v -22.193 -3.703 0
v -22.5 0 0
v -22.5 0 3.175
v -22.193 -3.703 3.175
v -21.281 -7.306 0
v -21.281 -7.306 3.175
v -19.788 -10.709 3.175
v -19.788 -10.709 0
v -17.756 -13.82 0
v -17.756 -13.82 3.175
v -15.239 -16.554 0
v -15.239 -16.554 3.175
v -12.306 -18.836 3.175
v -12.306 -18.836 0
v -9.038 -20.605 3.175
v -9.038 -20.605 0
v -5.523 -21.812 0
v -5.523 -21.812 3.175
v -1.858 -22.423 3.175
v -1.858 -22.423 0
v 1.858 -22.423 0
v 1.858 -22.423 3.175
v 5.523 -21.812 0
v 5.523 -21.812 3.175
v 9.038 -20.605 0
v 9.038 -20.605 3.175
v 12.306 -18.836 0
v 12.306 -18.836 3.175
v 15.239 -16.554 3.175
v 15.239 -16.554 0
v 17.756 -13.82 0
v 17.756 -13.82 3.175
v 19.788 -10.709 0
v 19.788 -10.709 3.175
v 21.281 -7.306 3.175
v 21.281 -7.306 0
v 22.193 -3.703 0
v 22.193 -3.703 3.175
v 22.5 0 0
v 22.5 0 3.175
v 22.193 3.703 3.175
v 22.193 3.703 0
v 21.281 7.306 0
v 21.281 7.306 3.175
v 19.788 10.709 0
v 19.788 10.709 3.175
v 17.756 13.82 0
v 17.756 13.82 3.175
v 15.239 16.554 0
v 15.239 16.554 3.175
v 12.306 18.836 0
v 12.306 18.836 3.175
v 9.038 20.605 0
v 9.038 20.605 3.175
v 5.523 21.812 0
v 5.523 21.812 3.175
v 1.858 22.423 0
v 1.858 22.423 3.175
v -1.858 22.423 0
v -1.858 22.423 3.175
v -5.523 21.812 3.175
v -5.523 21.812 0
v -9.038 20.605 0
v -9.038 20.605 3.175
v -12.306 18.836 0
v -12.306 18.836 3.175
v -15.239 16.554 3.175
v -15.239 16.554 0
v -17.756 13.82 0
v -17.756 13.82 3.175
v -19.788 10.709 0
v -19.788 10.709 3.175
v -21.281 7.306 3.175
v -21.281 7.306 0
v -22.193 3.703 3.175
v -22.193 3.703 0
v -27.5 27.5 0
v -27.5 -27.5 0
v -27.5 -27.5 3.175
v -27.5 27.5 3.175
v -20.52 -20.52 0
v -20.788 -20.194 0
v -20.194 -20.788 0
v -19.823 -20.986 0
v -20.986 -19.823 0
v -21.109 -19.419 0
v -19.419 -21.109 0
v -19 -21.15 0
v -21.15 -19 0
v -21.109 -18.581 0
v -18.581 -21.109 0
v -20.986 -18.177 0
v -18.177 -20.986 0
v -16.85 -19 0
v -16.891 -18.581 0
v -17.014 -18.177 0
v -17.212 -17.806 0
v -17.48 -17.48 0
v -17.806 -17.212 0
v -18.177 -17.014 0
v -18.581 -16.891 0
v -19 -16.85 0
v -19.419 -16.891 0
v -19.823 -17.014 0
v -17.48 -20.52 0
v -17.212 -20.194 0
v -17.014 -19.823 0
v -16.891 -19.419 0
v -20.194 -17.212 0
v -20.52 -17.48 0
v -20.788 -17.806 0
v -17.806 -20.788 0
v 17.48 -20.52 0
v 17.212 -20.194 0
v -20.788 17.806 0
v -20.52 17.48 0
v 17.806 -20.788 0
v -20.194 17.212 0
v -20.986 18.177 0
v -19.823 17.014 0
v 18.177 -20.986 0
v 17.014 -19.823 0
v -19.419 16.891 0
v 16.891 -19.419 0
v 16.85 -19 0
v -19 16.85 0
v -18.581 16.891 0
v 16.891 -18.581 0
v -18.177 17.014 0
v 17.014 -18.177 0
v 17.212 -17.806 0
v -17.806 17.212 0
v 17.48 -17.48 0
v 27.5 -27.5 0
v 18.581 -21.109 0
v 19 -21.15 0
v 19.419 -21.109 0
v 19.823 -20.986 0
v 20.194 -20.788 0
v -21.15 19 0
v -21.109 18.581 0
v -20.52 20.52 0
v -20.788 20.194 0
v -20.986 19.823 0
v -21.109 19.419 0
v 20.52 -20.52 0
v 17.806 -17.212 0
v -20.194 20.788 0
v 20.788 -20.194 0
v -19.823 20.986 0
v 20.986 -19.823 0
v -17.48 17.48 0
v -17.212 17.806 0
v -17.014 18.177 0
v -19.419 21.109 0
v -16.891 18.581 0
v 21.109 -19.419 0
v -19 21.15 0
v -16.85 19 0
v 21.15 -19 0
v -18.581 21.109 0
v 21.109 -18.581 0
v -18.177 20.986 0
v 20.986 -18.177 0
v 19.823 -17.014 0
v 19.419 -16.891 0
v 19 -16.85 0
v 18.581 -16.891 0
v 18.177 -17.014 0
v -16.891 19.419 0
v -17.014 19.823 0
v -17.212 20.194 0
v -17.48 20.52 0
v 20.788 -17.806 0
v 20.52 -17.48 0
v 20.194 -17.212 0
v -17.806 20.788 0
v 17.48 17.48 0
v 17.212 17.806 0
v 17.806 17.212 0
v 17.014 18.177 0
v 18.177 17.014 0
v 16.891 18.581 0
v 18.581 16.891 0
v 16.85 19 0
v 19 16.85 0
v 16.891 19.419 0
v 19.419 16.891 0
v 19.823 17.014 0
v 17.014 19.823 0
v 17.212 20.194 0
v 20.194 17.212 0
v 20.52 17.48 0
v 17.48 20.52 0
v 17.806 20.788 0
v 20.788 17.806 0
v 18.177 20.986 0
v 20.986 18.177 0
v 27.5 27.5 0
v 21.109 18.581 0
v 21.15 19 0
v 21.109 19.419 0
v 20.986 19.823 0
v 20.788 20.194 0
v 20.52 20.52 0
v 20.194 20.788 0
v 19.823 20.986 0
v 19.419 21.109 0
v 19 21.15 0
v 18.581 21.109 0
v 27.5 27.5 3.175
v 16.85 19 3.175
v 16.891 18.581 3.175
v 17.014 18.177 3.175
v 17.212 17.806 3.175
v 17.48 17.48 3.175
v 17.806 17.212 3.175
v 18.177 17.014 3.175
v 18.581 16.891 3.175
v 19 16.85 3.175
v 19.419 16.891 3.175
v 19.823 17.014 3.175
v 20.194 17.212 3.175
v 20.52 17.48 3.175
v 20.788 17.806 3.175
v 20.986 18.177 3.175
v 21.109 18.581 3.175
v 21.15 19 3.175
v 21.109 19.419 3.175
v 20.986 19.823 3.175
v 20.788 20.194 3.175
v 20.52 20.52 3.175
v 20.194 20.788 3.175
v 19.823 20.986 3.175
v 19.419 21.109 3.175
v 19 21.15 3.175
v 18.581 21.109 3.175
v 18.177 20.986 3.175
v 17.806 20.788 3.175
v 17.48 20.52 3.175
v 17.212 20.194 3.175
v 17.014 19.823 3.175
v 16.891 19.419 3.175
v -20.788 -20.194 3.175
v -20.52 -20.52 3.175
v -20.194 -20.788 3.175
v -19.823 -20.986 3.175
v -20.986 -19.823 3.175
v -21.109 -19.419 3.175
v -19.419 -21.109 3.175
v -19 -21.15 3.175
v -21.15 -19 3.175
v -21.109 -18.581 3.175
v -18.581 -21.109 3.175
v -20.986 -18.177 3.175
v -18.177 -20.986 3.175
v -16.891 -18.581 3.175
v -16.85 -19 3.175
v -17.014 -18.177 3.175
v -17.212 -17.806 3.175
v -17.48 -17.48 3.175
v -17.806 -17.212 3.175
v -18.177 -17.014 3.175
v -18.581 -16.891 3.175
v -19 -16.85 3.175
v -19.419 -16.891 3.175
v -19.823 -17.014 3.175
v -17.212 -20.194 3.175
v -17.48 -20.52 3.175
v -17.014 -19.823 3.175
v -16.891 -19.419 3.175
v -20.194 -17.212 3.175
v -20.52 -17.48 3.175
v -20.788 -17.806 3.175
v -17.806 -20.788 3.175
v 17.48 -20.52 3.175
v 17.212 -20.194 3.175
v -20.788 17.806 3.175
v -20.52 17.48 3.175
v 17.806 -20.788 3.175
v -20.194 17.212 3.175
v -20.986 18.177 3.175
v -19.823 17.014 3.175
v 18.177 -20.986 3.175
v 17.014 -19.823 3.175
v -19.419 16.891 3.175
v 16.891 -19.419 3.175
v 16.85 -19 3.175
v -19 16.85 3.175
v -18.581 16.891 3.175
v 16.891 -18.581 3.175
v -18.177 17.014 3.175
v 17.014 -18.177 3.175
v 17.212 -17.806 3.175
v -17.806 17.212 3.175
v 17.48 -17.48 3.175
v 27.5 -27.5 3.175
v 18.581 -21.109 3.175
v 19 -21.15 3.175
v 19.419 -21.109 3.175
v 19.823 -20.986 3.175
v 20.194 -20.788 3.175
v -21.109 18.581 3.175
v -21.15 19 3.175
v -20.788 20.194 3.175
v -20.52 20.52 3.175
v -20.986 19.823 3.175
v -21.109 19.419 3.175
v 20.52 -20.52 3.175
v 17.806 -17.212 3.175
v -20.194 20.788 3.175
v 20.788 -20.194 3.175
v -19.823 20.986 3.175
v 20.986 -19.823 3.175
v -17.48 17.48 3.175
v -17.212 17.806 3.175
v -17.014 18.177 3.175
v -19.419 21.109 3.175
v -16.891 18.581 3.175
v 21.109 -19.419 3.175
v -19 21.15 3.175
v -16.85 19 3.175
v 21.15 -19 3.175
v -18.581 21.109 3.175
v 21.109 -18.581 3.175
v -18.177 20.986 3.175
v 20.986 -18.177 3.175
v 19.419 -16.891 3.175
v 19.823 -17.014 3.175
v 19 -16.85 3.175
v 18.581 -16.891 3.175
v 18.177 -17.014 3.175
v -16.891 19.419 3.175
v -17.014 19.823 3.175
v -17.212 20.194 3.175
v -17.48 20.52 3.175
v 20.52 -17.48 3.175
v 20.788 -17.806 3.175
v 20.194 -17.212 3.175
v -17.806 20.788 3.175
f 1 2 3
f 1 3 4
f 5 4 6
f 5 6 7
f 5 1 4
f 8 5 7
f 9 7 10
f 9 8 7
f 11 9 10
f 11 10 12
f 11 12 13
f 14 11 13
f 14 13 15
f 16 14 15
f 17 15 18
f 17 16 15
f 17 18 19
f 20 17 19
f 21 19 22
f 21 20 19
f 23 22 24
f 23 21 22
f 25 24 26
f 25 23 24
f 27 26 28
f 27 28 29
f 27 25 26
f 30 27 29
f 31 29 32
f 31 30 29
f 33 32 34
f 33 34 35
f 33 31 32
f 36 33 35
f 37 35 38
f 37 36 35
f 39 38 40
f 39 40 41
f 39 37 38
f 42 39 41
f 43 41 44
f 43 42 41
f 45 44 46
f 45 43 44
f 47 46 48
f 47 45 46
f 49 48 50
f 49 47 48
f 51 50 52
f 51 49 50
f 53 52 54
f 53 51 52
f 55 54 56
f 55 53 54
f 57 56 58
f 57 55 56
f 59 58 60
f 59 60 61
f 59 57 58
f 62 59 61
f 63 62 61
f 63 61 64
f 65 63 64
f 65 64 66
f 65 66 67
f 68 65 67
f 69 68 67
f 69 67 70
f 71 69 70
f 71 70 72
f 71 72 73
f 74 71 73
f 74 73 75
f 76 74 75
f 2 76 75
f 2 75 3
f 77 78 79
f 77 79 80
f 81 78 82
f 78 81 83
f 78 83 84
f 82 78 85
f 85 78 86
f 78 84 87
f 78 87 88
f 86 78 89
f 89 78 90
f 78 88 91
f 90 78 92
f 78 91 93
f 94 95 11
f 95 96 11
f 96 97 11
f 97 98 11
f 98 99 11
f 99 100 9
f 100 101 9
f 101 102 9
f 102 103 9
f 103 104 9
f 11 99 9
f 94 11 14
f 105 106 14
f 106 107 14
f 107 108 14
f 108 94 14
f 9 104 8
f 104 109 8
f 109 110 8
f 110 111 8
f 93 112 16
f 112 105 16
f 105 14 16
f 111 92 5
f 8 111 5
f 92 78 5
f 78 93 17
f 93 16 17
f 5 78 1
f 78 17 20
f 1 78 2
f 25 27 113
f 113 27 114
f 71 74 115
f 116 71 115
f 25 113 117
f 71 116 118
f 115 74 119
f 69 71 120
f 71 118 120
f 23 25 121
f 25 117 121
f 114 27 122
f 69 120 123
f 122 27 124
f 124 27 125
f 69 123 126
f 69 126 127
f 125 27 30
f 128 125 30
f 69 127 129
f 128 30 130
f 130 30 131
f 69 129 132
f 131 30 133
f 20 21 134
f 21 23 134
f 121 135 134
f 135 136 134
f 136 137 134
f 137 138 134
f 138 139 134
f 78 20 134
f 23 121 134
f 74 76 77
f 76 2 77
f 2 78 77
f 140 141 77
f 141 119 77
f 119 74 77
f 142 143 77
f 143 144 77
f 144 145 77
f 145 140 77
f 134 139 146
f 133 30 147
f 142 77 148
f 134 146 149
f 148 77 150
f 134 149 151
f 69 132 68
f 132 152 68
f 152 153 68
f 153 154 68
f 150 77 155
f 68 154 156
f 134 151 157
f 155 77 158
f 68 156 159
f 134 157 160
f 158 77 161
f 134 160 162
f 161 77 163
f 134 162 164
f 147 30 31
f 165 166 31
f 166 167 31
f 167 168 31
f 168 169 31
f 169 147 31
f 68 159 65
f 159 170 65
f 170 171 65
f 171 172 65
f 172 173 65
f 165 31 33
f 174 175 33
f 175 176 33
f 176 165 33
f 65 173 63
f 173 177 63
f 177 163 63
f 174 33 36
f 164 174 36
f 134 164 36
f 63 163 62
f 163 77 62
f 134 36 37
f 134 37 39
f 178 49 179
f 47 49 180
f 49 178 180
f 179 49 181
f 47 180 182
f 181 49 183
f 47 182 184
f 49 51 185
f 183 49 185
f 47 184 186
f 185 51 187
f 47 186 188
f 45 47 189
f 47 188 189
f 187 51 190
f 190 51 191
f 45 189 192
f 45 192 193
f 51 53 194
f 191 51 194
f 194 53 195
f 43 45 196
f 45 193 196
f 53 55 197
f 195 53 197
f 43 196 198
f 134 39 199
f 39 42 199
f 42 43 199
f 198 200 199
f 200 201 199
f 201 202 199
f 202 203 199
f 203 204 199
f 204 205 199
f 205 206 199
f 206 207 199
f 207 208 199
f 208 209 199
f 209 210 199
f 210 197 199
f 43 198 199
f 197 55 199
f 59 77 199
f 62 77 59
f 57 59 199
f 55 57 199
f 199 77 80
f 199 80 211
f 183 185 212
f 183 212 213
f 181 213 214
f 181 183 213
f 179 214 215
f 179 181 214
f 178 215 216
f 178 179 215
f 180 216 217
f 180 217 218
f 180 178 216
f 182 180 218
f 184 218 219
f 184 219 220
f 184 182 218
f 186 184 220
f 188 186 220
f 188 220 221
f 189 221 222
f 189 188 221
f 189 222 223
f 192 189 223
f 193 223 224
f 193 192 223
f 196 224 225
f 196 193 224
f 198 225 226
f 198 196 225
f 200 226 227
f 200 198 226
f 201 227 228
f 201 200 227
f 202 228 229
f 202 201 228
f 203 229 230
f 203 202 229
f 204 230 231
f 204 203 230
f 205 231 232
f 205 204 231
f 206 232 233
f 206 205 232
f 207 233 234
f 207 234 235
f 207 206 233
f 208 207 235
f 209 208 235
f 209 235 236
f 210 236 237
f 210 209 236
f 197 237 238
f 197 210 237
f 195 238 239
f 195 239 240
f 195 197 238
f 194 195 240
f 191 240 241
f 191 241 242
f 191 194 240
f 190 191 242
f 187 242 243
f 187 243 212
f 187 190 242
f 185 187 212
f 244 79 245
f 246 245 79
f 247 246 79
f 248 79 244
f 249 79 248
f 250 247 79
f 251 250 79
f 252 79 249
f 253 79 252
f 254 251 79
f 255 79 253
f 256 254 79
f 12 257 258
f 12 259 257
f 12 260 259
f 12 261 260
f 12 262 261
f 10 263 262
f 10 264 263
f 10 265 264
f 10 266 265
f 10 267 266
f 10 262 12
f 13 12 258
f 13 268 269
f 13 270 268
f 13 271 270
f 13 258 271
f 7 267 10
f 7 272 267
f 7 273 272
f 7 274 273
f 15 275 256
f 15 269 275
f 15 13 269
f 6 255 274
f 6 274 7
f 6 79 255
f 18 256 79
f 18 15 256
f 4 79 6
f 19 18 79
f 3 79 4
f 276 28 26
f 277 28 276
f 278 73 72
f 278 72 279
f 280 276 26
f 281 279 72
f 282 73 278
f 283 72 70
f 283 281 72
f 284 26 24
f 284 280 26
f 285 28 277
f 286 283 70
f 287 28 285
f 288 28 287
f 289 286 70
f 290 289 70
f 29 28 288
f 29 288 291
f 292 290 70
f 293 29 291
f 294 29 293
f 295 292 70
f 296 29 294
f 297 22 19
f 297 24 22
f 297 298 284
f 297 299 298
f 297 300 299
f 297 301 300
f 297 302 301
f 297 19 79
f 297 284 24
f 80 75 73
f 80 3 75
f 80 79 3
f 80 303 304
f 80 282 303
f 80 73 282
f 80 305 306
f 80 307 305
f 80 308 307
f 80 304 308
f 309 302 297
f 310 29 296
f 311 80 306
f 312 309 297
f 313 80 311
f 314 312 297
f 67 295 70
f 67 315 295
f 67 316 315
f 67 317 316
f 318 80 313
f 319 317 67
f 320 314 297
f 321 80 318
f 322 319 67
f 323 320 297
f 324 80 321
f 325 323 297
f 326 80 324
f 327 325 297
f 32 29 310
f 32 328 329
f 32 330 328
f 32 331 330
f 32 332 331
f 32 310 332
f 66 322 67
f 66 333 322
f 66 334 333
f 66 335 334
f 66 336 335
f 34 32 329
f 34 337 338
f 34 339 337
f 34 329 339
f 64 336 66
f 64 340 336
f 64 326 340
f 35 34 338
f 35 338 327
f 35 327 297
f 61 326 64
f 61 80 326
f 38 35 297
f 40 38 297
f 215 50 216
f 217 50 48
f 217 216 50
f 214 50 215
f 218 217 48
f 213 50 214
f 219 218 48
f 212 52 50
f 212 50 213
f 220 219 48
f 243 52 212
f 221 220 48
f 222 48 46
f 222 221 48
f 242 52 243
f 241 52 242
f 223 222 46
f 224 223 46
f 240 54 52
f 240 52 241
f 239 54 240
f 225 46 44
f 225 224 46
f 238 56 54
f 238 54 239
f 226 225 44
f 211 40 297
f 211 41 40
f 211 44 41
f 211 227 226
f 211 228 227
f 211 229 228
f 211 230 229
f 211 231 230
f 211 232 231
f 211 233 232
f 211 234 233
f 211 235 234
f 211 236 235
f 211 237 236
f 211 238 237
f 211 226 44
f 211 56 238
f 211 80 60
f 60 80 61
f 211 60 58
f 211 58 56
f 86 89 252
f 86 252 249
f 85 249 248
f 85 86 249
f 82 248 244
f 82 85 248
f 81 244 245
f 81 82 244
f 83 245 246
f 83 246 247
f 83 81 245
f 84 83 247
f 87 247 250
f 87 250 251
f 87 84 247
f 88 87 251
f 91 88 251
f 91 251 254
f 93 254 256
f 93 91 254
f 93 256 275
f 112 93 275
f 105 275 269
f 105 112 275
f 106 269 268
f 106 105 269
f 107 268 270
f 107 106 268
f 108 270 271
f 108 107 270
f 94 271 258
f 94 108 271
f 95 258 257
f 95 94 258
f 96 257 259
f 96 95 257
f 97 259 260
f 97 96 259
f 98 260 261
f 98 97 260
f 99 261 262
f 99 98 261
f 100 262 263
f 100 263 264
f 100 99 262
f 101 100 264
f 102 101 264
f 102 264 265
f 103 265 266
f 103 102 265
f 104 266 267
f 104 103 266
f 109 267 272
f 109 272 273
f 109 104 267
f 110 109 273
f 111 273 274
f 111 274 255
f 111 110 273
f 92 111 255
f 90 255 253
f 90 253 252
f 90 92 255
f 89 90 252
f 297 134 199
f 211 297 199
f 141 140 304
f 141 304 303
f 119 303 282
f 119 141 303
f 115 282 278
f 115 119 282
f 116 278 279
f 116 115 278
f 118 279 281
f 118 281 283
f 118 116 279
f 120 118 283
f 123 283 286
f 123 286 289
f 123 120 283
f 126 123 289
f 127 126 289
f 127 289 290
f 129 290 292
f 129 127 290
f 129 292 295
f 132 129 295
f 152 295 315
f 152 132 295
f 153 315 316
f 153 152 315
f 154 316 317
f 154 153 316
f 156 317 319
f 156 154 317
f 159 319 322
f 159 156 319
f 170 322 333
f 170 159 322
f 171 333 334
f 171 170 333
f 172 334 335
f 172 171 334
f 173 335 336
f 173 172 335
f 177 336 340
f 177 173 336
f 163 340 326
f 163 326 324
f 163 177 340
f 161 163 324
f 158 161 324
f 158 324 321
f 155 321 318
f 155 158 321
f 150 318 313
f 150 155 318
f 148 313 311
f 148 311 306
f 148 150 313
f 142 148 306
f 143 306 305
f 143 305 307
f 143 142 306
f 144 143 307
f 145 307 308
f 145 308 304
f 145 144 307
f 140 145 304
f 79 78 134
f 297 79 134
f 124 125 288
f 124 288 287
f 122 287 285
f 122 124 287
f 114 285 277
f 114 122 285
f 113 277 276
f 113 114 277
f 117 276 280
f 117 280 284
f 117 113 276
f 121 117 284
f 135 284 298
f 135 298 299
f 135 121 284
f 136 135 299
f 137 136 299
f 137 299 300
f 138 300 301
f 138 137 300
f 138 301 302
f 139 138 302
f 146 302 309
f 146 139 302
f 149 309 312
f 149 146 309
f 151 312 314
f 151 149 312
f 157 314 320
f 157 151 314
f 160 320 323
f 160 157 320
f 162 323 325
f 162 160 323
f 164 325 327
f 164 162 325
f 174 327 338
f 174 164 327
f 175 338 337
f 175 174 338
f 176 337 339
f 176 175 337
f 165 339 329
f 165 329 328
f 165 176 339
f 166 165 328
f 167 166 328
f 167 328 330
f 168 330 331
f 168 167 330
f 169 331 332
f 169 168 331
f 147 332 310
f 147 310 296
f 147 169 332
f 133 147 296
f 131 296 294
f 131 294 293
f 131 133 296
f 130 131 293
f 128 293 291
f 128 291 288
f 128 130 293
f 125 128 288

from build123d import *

# Parameters (mm, degrees)
SKETCH1_W           = 55
SKETCH1_H           = 55
SKETCH1_R           = 22.5
SKETCH1_R_2         = 2.15
BOSS_EXTRUDE1_DEPTH = 3.175


with BuildPart() as part:
    # Sketch1 → Boss-Extrude1 (new body)
    with BuildSketch(Plane.XY):
        Rectangle(SKETCH1_W, SKETCH1_H)
        Circle(SKETCH1_R, mode=Mode.SUBTRACT)
        with Locations((19, 19)):
            Circle(SKETCH1_R_2, mode=Mode.SUBTRACT)
        with Locations((19, -19)):
            Circle(SKETCH1_R_2, mode=Mode.SUBTRACT)
        with Locations((-19, -19)):
            Circle(SKETCH1_R_2, mode=Mode.SUBTRACT)
        with Locations((-19, 19)):
            Circle(SKETCH1_R_2, mode=Mode.SUBTRACT)
    extrude(amount=BOSS_EXTRUDE1_DEPTH)


solid = part.part
